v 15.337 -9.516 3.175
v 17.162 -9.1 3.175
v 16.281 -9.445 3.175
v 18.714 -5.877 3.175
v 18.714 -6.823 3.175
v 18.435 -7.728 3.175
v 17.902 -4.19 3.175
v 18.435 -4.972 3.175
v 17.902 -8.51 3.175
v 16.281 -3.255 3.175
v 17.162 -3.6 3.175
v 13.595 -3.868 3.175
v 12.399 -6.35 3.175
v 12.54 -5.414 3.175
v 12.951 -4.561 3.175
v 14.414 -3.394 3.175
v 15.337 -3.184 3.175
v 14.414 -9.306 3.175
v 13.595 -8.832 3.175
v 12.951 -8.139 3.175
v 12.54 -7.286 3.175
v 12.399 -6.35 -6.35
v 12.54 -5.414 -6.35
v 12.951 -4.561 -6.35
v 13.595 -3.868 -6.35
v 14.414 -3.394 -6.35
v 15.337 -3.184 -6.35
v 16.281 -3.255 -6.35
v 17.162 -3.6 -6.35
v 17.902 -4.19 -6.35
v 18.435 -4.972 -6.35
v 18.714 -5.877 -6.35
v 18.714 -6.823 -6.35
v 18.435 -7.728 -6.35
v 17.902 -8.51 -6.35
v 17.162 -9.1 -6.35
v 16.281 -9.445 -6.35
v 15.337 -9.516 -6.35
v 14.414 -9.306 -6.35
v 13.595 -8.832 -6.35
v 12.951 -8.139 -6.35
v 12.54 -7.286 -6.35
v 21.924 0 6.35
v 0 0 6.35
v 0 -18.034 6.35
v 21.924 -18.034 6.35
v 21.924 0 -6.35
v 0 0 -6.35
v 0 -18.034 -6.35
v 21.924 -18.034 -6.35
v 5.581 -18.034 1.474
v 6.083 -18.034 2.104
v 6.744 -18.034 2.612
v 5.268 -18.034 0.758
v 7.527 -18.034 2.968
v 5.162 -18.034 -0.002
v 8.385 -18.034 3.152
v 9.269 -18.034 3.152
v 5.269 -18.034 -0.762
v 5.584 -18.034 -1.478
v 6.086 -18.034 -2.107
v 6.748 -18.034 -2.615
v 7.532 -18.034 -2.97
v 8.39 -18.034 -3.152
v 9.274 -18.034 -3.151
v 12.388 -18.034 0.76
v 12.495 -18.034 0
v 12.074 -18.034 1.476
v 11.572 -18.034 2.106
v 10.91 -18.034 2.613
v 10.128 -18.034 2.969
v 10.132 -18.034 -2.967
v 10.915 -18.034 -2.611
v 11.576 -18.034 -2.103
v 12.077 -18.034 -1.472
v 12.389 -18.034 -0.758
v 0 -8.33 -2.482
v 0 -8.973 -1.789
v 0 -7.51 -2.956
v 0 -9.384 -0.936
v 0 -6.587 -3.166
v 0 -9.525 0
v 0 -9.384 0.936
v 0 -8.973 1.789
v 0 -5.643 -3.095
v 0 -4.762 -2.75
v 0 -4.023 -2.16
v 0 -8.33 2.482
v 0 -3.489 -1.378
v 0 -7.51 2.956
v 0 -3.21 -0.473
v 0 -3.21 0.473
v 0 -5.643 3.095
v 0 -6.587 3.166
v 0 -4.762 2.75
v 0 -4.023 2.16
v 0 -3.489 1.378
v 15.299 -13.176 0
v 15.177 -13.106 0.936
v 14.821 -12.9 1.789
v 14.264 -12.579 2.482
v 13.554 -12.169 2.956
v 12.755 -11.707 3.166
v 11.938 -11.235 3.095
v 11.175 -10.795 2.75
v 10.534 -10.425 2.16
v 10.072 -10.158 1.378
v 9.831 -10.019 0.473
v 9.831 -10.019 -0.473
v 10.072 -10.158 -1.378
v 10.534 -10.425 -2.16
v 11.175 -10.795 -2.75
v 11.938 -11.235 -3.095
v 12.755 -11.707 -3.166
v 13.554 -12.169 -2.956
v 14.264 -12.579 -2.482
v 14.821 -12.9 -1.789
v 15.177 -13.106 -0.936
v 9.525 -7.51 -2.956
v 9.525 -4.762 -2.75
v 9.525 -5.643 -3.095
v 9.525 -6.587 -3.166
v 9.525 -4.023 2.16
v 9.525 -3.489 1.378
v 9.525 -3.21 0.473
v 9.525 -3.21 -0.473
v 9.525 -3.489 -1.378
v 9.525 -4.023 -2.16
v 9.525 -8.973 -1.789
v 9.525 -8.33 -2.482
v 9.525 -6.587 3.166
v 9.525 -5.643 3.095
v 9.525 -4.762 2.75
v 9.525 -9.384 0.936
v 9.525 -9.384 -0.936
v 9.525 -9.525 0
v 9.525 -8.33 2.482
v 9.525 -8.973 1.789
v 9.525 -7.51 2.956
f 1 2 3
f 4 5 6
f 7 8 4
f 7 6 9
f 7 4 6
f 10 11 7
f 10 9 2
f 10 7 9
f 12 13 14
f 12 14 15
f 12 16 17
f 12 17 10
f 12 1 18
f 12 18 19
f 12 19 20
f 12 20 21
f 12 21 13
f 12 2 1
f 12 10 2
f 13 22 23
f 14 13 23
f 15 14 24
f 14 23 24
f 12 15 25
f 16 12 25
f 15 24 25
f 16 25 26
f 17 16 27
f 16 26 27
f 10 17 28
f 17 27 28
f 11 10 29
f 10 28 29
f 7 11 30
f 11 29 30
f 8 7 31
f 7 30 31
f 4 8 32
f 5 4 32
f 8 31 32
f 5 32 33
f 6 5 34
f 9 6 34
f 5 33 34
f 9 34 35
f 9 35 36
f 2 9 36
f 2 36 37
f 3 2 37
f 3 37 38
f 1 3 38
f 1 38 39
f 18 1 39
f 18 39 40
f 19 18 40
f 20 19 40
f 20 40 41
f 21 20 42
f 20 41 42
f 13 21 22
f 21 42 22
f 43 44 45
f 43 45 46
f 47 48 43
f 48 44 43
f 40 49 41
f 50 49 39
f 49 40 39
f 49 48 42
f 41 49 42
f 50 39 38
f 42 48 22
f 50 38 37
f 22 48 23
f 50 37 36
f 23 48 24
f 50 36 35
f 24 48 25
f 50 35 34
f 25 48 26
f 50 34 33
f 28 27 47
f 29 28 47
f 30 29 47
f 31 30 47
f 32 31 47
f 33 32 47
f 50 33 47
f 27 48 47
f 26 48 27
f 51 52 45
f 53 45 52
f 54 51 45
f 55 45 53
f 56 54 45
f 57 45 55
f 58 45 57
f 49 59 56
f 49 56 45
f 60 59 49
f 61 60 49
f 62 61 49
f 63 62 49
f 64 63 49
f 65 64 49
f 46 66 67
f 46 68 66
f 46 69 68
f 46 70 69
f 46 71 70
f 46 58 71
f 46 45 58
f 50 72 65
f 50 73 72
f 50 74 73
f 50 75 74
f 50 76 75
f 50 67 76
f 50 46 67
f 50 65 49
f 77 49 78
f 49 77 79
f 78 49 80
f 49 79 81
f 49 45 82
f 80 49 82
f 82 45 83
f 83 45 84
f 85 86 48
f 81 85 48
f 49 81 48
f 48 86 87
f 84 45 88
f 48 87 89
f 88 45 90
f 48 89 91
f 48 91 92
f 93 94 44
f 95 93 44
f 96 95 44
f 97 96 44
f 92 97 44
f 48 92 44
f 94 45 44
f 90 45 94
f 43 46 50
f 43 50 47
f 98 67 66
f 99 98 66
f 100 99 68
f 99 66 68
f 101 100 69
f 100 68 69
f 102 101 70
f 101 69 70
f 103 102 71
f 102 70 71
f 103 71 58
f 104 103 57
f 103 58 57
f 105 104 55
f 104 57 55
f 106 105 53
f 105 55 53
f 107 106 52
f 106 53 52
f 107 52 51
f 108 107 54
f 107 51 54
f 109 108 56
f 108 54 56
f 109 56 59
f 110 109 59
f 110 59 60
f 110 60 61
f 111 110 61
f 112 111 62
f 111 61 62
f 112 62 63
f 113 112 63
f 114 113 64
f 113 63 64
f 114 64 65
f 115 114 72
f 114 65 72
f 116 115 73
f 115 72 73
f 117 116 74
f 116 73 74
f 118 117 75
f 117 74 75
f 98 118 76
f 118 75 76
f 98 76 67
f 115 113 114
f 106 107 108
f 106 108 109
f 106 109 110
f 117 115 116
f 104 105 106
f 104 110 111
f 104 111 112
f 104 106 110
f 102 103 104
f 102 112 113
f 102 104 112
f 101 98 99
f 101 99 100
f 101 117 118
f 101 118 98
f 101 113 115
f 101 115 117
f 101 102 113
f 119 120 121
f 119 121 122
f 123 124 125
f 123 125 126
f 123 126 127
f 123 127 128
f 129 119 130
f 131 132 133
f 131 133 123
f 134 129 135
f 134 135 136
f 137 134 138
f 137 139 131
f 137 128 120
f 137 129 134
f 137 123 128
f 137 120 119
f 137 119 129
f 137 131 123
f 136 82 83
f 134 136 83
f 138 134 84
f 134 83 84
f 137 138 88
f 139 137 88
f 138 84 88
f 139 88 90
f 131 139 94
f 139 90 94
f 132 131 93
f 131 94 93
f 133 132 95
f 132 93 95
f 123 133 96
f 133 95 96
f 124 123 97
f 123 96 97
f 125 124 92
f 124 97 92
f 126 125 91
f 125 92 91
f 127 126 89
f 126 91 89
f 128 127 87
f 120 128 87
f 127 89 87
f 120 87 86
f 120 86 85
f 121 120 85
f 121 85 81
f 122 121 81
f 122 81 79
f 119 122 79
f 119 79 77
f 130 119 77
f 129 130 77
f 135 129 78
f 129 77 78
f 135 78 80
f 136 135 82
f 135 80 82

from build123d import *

# Parameters (mm, degrees)
SKETCH3_W                      = 21.924187445
SKETCH3_H                      = 19.837641971
BOSS_EXTRUDE1_DEPTH            = 6.35
SKETCH4_R                      = 3.175
CUT_EXTRUDE1_DEPTH             = 9.525
SKETCH5_R                      = 3.175
CUT_EXTRUDE5_DEPTH             = 9.525
CUT_EXTRUDE5_DIRECTION_2_REACH = 27.174
SKETCH6_R                      = 3.175
CUT_EXTRUDE6_DEPTH             = 9.525
SKETCH7_W                      = 12.7
SKETCH7_H                      = 1.803641971
CUT_EXTRUDE7_DEPTH             = 31.241106695


with BuildPart() as part:
    # Sketch3 → Boss-Extrude1 (new, symmetric)
    with BuildSketch(Plane.XY):
        with Locations((10.962093723, -9.918820986)):
            Rectangle(SKETCH3_W, SKETCH3_H)
    extrude(amount=BOSS_EXTRUDE1_DEPTH, both=True)

    # Sketch4 → Cut-Extrude1 (cut)
    with BuildSketch(Plane.ZY):
        with Locations(Location((0, -6.35, 0), (0, 0, 270))):
            Circle(SKETCH4_R)
    extrude(amount=-CUT_EXTRUDE1_DEPTH, mode=Mode.SUBTRACT)

    # Sketch5 → Cut-Extrude5 (cut)
    with BuildSketch(Plane(origin=(7.787093723, -19.837641971, 0), x_dir=(-0.8660254037844382, 0.500000000000001, 0), z_dir=(-0.500000000000001, -0.8660254037844382, 0))):
        with Locations(Location((0, 0, 0), (0, 0, 180))):
            Circle(SKETCH5_R)
    extrude(amount=-CUT_EXTRUDE5_DEPTH, mode=Mode.SUBTRACT)

    # Sketch5 → Cut-Extrude5 direction 2 (cut, up to next)
    with BuildSketch(Plane(origin=(7.787093723, -19.837641971, 0), x_dir=(-0.8660254037844382, 0.500000000000001, 0), z_dir=(-0.500000000000001, -0.8660254037844382, 0)), mode=Mode.PRIVATE) as cut_extrude5_direction_2_sk1:
        with Locations(Location((0, 0, 0), (0, 0, 180))):
            Circle(SKETCH5_R)
    cut_extrude5_direction_2_tool1 = extrude(cut_extrude5_direction_2_sk1.sketch, amount=CUT_EXTRUDE5_DIRECTION_2_REACH, mode=Mode.PRIVATE) & part.part
    add(cut_extrude5_direction_2_tool1.solids().sort_by_distance((7.787094, -19.837642, 0))[0], mode=Mode.SUBTRACT)

    # Sketch6 → Cut-Extrude6 (cut)
    with BuildSketch(Plane(origin=(0, 0, -6.35), x_dir=(-1, 0, 0), z_dir=(0, 0, -1))):
        with Locations((-15.574187445, -6.35)):
            Circle(SKETCH6_R)
    extrude(amount=-CUT_EXTRUDE6_DEPTH, mode=Mode.SUBTRACT)

    # Sketch7 → Cut-Extrude7 (cut, through all)
    with BuildSketch(Plane(origin=(21.924187445, 0, 0), x_dir=(0, 0, -1), z_dir=(1, 0, 0))):
        with Locations((0, -18.935820986)):
            Rectangle(SKETCH7_W, SKETCH7_H)
    extrude(amount=-CUT_EXTRUDE7_DEPTH, mode=Mode.SUBTRACT)


solid = part.part
